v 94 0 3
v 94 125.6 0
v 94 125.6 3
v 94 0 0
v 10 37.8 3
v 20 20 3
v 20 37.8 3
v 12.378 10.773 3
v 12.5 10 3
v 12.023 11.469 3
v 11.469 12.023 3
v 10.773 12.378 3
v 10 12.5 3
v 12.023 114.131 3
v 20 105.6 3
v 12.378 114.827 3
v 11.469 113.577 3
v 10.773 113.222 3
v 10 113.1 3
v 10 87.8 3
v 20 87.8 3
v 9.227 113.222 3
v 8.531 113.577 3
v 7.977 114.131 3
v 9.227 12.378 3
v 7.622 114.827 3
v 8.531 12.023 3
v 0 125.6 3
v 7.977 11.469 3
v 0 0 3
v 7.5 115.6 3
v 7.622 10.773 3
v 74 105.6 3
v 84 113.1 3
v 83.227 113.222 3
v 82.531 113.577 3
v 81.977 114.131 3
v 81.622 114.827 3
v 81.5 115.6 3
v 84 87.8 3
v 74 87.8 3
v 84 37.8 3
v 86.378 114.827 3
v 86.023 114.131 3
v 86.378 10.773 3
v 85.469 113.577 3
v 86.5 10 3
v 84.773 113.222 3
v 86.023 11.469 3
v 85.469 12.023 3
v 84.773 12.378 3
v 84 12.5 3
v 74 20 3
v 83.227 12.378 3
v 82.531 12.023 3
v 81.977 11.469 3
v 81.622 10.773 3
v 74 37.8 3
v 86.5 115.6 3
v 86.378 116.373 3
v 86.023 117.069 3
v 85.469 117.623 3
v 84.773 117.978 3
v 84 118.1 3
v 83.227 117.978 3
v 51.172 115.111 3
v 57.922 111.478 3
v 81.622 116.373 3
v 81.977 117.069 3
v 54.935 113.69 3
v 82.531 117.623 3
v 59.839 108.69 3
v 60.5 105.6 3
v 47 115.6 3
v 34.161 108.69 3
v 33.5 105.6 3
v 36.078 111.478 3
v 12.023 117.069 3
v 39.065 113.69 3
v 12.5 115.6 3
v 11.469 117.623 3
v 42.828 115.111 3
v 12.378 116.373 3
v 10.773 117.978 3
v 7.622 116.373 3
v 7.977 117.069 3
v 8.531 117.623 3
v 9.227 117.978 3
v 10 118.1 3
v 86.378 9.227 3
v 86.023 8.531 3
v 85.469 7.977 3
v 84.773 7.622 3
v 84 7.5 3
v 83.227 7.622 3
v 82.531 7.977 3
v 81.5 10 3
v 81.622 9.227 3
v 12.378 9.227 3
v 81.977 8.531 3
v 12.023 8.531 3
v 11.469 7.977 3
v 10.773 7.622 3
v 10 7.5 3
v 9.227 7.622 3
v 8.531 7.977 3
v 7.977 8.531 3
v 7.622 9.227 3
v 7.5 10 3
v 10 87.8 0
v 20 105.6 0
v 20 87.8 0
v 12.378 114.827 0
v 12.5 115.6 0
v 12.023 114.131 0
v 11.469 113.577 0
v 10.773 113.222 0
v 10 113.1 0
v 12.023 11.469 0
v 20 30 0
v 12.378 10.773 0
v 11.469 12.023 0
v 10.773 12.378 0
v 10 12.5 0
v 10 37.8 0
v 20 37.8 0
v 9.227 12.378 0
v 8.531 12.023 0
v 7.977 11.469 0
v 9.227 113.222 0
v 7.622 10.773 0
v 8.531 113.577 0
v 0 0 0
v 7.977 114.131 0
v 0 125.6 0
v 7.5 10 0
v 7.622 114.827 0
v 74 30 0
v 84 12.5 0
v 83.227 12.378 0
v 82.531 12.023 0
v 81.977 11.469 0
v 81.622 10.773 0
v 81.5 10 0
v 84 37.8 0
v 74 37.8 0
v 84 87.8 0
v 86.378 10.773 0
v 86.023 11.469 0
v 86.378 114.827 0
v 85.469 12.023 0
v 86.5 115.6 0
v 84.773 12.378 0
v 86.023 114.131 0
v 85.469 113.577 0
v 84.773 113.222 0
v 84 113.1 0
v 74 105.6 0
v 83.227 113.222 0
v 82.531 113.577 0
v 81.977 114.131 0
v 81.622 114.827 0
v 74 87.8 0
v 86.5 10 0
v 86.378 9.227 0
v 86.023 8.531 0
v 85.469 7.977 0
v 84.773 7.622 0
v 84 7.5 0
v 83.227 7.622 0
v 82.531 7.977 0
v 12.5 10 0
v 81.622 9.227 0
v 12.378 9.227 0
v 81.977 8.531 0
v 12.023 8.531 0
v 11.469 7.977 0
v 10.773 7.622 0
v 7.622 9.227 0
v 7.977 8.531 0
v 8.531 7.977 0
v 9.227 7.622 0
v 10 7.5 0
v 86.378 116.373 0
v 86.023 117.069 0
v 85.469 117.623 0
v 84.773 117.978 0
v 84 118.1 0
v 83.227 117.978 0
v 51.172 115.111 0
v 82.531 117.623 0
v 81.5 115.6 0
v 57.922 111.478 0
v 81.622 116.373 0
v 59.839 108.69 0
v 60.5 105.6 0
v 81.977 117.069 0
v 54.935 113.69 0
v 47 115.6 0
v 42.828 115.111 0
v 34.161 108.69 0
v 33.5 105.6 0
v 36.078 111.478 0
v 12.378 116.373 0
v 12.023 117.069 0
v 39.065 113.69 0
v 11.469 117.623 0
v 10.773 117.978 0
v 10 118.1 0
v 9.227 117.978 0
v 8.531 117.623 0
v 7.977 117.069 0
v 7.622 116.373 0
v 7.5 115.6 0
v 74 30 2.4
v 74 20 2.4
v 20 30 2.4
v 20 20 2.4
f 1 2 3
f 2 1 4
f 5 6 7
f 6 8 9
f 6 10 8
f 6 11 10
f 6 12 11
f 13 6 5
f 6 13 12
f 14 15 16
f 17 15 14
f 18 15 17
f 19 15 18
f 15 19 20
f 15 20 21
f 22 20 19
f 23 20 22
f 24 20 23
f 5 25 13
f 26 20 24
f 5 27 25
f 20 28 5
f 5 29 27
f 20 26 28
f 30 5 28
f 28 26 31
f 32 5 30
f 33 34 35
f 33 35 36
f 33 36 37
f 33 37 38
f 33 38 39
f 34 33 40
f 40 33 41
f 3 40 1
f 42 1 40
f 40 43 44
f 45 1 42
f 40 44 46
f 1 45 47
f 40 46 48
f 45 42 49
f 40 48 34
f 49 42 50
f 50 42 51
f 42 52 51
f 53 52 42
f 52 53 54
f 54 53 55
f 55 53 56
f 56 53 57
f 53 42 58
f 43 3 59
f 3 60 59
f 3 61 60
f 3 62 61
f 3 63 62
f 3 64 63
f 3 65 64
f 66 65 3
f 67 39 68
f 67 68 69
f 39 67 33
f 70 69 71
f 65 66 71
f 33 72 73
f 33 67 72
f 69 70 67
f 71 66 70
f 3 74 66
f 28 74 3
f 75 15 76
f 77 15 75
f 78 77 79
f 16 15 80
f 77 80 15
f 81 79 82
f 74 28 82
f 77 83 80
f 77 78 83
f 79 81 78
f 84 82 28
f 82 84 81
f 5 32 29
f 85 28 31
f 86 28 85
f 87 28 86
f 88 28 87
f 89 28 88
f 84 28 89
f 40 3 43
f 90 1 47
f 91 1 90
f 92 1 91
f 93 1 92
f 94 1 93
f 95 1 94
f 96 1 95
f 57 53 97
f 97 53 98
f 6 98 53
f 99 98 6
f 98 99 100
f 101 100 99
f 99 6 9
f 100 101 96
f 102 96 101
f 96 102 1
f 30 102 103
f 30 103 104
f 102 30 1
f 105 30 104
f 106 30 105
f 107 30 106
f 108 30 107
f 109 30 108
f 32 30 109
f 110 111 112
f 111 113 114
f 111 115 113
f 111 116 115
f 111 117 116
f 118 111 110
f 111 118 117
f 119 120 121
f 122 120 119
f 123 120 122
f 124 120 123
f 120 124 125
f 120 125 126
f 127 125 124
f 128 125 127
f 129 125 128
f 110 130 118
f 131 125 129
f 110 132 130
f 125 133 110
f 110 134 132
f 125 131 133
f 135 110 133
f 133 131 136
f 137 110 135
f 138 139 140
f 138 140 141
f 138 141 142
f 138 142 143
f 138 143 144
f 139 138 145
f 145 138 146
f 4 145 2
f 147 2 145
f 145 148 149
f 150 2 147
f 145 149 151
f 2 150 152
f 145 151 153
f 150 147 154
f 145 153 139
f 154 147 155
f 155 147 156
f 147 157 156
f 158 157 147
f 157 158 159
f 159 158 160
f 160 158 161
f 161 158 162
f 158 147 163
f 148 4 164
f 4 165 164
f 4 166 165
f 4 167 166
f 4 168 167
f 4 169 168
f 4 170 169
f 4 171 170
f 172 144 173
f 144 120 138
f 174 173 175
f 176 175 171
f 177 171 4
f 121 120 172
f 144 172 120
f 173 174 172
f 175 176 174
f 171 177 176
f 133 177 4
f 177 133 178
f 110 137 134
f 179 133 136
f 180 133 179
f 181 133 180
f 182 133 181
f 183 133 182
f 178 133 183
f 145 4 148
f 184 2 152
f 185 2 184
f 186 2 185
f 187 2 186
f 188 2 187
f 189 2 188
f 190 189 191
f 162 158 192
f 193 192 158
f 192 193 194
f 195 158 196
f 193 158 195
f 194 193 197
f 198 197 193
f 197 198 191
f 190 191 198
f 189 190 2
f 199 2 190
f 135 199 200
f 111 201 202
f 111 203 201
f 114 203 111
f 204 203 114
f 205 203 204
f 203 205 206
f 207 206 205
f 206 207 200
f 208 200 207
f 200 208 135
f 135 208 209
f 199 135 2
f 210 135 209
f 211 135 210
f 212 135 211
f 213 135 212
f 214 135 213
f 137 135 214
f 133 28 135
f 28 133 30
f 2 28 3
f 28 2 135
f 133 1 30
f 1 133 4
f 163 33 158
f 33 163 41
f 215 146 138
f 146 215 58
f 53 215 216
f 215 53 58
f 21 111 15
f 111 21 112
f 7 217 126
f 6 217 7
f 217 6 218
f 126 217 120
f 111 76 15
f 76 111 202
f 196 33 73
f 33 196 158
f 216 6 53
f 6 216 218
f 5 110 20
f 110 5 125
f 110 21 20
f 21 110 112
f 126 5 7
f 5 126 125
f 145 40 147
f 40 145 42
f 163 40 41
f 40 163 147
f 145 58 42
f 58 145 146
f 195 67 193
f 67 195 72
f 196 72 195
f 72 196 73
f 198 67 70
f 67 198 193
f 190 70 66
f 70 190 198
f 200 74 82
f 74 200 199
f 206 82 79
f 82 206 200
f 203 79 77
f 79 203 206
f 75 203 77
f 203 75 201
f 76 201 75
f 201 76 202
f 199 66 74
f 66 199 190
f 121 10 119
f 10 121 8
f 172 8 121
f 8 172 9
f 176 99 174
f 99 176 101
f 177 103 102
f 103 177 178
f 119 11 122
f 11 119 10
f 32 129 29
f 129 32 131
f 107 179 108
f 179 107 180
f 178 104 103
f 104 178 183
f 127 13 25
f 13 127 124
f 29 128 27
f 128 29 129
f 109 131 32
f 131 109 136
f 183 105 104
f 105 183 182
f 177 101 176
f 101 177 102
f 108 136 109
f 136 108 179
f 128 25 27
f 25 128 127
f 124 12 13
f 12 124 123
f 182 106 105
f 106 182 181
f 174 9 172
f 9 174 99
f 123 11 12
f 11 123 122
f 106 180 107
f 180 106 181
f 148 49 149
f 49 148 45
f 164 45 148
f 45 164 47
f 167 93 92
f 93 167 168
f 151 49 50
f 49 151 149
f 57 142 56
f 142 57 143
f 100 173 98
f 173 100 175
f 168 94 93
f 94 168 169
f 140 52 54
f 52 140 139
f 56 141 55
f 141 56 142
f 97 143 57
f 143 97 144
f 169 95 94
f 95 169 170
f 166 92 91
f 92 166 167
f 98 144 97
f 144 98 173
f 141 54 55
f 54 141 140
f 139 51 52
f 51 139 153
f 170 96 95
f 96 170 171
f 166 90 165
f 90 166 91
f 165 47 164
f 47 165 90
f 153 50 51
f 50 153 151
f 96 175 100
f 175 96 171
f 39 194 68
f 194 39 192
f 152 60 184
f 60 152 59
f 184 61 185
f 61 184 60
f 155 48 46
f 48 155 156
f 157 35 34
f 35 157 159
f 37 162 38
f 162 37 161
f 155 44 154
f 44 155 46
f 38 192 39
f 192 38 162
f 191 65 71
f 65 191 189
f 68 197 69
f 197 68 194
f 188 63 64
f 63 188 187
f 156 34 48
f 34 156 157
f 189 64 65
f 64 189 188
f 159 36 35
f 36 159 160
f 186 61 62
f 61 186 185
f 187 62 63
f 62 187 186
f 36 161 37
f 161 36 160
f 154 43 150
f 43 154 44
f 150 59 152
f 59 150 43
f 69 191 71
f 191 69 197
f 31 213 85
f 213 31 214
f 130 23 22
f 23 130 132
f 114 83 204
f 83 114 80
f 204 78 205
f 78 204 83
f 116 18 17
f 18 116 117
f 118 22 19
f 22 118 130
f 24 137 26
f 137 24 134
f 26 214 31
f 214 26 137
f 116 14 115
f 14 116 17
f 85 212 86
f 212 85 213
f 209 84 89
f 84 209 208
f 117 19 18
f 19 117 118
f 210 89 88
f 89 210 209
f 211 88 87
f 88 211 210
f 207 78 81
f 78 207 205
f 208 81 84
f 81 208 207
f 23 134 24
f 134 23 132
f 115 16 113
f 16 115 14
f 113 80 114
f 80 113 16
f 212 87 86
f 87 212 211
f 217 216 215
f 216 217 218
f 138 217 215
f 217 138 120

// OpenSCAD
/* Width of flaps */
CARD_WIDTH = 54;
/* Height of flaps */
CARD_HEIGHT = 85.6;
/* Thickness of flaps */
CARD_THICKNESS = 0.6;

JIG_THICKNESS = 20;
JIG_OVERLAP = 10;
JIG_HEIGHT = 3;

MIDDLE_HEIGHT = 50;
MIDDLE_WIDTH = 10;

FINGER_DIAMETER = 20;

RETAINER_DEPTH = 10;

FULL_JIG_WIDTH = CARD_WIDTH + 2 * JIG_THICKNESS;
FULL_JIG_HEIGHT = CARD_HEIGHT + 2 * JIG_THICKNESS;

HOLE_DIAM = 5;
HOLE_OFFSET = 10;

$fn = 20;
difference() {
    cube([FULL_JIG_WIDTH, FULL_JIG_HEIGHT, JIG_HEIGHT]);
    translate([JIG_THICKNESS, JIG_THICKNESS, 0]) cube([CARD_WIDTH, CARD_HEIGHT, JIG_HEIGHT]);
    /* Side opening */
    translate([JIG_THICKNESS - MIDDLE_WIDTH, JIG_THICKNESS + CARD_HEIGHT/2 - MIDDLE_HEIGHT/2, 0]) cube([MIDDLE_WIDTH, MIDDLE_HEIGHT, JIG_HEIGHT]);
    
    translate([JIG_THICKNESS + CARD_WIDTH, JIG_THICKNESS + CARD_HEIGHT/2 - MIDDLE_HEIGHT/2, 0]) cube([MIDDLE_WIDTH, MIDDLE_HEIGHT, JIG_HEIGHT]);
    
    /* Finger thingy */
    translate([JIG_THICKNESS + CARD_WIDTH/2, CARD_HEIGHT + JIG_THICKNESS, 0]) resize([CARD_WIDTH/2, FINGER_DIAMETER], JIG_HEIGHT) cylinder(d = 1, h = JIG_HEIGHT);
    /* Holes */
    translate([HOLE_OFFSET, HOLE_OFFSET]) cylinder(d = HOLE_DIAM, h = JIG_THICKNESS);
    translate([FULL_JIG_WIDTH - HOLE_OFFSET, HOLE_OFFSET]) cylinder(d = HOLE_DIAM, h = JIG_THICKNESS);
    translate([FULL_JIG_WIDTH - HOLE_OFFSET, FULL_JIG_HEIGHT - HOLE_OFFSET]) cylinder(d = HOLE_DIAM, h = JIG_THICKNESS);
    translate([HOLE_OFFSET, FULL_JIG_HEIGHT - HOLE_OFFSET]) cylinder(d = HOLE_DIAM, h = JIG_THICKNESS);
}
/* Card Retainer */
translate([0, JIG_THICKNESS, 0]) cube([FULL_JIG_WIDTH, RETAINER_DEPTH, JIG_HEIGHT - CARD_THICKNESS]);
